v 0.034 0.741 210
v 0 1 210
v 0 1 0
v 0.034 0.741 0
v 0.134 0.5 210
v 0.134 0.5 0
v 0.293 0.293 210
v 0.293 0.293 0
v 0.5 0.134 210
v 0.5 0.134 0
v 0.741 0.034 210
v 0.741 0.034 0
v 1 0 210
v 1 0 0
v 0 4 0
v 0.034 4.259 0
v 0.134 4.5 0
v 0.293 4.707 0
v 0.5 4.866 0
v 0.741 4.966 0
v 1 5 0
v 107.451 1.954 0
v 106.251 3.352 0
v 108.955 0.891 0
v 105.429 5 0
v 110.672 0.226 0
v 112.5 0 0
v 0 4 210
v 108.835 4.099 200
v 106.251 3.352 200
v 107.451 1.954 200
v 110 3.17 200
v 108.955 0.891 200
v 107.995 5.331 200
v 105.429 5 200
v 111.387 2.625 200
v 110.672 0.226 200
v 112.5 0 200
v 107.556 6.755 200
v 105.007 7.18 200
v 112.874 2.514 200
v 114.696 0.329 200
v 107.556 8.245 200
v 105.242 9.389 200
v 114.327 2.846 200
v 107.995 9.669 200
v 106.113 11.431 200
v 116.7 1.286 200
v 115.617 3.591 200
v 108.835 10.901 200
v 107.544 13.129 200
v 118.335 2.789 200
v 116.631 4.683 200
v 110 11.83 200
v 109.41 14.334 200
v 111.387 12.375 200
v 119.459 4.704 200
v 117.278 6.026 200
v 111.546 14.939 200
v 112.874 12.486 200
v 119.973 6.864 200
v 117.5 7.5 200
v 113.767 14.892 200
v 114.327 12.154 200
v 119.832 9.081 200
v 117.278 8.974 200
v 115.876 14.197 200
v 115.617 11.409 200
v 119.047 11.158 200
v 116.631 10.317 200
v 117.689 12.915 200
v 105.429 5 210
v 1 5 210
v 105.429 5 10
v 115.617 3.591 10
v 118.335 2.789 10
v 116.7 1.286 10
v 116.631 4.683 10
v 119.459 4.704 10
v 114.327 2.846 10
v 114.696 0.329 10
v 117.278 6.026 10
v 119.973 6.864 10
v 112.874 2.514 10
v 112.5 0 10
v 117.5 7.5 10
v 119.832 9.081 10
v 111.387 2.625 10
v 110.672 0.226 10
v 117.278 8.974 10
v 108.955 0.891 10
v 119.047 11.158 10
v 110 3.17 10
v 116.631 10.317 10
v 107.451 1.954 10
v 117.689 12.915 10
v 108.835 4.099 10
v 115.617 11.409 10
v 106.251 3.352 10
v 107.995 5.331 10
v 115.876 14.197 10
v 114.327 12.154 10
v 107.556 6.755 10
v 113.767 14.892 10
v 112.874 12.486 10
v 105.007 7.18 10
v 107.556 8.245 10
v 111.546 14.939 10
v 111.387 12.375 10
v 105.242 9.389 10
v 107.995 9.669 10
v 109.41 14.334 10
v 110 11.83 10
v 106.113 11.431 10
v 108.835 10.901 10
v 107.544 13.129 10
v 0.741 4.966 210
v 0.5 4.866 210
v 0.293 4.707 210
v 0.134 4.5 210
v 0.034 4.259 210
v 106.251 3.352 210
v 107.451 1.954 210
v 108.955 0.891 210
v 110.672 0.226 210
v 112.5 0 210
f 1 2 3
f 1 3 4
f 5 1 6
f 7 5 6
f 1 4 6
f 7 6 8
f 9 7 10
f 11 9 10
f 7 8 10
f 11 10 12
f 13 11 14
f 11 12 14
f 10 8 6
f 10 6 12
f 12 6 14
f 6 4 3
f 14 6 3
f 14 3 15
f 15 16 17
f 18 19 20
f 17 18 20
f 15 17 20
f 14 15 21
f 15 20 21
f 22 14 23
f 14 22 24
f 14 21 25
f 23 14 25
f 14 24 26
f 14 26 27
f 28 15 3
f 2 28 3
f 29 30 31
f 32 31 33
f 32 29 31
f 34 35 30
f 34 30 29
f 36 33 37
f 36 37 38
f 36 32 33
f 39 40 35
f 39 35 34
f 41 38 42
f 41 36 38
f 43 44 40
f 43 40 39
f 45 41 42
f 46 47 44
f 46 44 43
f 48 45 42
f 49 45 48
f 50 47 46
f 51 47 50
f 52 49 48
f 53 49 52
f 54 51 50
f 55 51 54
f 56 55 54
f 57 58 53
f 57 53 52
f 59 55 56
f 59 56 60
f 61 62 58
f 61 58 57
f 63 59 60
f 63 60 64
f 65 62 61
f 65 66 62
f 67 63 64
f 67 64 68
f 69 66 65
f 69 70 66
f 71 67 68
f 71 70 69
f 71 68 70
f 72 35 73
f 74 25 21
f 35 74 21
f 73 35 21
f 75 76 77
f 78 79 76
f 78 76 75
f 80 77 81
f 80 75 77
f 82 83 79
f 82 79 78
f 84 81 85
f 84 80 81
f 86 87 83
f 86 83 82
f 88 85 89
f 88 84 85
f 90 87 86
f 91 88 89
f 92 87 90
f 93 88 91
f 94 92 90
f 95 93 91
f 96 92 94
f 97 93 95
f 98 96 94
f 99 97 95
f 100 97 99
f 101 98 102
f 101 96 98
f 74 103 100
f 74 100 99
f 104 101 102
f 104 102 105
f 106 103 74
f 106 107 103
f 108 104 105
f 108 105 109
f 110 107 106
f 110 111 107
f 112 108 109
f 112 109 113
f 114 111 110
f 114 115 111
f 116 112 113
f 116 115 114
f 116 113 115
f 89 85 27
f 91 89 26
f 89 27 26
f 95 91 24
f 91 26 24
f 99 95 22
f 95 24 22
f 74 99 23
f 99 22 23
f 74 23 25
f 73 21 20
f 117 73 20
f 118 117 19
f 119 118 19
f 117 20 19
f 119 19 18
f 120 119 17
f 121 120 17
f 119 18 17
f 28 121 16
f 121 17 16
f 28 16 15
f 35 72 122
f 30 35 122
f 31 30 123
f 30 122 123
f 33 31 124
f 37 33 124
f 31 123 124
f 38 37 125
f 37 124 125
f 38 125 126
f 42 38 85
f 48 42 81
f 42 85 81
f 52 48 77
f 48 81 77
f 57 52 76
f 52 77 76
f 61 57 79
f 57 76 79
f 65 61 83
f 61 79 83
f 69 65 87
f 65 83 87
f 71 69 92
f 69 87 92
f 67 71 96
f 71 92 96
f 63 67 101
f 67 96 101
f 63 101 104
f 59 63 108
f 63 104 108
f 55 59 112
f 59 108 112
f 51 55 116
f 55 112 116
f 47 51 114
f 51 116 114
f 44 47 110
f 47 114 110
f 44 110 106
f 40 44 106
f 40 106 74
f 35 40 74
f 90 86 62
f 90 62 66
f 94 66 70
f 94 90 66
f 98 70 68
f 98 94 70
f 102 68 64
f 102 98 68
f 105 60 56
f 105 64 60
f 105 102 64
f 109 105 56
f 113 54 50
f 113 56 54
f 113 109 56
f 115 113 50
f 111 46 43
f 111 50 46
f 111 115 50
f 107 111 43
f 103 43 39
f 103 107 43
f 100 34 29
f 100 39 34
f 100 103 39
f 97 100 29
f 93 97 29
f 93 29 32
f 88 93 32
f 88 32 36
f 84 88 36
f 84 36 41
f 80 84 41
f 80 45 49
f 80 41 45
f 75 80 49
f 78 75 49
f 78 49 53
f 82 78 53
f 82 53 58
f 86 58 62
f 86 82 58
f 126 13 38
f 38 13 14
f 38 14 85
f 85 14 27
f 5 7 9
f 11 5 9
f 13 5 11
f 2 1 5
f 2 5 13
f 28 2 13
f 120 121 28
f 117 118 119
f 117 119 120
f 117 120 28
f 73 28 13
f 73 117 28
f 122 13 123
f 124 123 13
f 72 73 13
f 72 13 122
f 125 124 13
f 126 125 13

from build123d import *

# Parameters (mm, degrees)
SKETCH_1_R          = 5
EXTRUDE_1_DEPTH     = 210
SKETCH_2_R          = 7.5
CUT_EXTRUDE_1_DEPTH = 10
SKETCH_3_R          = 7.5
CUT_EXTRUDE_2_DEPTH = 10


with BuildPart() as part:
    # 草图1 → 凸台-拉伸1 (new body)
    with BuildSketch(Plane.XY):
        with BuildLine():
            Line((105.428932188, 5), (100.074072144, 5))
            Line((100.074072144, 5), (1, 5))
            ThreePointArc((1, 5), (0.292893219, 4.707106781), (0, 4))
            Line((0, 4), (0, 1))
            ThreePointArc((0, 1), (0.292893219, 0.292893219), (1, 0))
            Line((1, 0), (112.5, 0))
            ThreePointArc((112.5, 0), (116.830127019, 13.623724357), (105.428932188, 5))
        make_face()
        with Locations((112.5, 7.5)):
            Circle(SKETCH_1_R, mode=Mode.SUBTRACT)
    extrude(amount=EXTRUDE_1_DEPTH)

    # 草图2 → 切除-拉伸1 (cut)
    with BuildSketch(Plane.XY.offset(210)):
        with Locations((112.5, 7.5)):
            Circle(SKETCH_2_R)
    extrude(amount=-CUT_EXTRUDE_1_DEPTH, mode=Mode.SUBTRACT)

    # 草图3 → 切除-拉伸2 (cut)
    with BuildSketch(Plane(origin=(0, 0, 0), x_dir=(-1, 0, 0), z_dir=(0, 0, -1))):
        with Locations((-112.5, 7.5)):
            Circle(SKETCH_3_R)
    extrude(amount=-CUT_EXTRUDE_2_DEPTH, mode=Mode.SUBTRACT)


solid = part.part
